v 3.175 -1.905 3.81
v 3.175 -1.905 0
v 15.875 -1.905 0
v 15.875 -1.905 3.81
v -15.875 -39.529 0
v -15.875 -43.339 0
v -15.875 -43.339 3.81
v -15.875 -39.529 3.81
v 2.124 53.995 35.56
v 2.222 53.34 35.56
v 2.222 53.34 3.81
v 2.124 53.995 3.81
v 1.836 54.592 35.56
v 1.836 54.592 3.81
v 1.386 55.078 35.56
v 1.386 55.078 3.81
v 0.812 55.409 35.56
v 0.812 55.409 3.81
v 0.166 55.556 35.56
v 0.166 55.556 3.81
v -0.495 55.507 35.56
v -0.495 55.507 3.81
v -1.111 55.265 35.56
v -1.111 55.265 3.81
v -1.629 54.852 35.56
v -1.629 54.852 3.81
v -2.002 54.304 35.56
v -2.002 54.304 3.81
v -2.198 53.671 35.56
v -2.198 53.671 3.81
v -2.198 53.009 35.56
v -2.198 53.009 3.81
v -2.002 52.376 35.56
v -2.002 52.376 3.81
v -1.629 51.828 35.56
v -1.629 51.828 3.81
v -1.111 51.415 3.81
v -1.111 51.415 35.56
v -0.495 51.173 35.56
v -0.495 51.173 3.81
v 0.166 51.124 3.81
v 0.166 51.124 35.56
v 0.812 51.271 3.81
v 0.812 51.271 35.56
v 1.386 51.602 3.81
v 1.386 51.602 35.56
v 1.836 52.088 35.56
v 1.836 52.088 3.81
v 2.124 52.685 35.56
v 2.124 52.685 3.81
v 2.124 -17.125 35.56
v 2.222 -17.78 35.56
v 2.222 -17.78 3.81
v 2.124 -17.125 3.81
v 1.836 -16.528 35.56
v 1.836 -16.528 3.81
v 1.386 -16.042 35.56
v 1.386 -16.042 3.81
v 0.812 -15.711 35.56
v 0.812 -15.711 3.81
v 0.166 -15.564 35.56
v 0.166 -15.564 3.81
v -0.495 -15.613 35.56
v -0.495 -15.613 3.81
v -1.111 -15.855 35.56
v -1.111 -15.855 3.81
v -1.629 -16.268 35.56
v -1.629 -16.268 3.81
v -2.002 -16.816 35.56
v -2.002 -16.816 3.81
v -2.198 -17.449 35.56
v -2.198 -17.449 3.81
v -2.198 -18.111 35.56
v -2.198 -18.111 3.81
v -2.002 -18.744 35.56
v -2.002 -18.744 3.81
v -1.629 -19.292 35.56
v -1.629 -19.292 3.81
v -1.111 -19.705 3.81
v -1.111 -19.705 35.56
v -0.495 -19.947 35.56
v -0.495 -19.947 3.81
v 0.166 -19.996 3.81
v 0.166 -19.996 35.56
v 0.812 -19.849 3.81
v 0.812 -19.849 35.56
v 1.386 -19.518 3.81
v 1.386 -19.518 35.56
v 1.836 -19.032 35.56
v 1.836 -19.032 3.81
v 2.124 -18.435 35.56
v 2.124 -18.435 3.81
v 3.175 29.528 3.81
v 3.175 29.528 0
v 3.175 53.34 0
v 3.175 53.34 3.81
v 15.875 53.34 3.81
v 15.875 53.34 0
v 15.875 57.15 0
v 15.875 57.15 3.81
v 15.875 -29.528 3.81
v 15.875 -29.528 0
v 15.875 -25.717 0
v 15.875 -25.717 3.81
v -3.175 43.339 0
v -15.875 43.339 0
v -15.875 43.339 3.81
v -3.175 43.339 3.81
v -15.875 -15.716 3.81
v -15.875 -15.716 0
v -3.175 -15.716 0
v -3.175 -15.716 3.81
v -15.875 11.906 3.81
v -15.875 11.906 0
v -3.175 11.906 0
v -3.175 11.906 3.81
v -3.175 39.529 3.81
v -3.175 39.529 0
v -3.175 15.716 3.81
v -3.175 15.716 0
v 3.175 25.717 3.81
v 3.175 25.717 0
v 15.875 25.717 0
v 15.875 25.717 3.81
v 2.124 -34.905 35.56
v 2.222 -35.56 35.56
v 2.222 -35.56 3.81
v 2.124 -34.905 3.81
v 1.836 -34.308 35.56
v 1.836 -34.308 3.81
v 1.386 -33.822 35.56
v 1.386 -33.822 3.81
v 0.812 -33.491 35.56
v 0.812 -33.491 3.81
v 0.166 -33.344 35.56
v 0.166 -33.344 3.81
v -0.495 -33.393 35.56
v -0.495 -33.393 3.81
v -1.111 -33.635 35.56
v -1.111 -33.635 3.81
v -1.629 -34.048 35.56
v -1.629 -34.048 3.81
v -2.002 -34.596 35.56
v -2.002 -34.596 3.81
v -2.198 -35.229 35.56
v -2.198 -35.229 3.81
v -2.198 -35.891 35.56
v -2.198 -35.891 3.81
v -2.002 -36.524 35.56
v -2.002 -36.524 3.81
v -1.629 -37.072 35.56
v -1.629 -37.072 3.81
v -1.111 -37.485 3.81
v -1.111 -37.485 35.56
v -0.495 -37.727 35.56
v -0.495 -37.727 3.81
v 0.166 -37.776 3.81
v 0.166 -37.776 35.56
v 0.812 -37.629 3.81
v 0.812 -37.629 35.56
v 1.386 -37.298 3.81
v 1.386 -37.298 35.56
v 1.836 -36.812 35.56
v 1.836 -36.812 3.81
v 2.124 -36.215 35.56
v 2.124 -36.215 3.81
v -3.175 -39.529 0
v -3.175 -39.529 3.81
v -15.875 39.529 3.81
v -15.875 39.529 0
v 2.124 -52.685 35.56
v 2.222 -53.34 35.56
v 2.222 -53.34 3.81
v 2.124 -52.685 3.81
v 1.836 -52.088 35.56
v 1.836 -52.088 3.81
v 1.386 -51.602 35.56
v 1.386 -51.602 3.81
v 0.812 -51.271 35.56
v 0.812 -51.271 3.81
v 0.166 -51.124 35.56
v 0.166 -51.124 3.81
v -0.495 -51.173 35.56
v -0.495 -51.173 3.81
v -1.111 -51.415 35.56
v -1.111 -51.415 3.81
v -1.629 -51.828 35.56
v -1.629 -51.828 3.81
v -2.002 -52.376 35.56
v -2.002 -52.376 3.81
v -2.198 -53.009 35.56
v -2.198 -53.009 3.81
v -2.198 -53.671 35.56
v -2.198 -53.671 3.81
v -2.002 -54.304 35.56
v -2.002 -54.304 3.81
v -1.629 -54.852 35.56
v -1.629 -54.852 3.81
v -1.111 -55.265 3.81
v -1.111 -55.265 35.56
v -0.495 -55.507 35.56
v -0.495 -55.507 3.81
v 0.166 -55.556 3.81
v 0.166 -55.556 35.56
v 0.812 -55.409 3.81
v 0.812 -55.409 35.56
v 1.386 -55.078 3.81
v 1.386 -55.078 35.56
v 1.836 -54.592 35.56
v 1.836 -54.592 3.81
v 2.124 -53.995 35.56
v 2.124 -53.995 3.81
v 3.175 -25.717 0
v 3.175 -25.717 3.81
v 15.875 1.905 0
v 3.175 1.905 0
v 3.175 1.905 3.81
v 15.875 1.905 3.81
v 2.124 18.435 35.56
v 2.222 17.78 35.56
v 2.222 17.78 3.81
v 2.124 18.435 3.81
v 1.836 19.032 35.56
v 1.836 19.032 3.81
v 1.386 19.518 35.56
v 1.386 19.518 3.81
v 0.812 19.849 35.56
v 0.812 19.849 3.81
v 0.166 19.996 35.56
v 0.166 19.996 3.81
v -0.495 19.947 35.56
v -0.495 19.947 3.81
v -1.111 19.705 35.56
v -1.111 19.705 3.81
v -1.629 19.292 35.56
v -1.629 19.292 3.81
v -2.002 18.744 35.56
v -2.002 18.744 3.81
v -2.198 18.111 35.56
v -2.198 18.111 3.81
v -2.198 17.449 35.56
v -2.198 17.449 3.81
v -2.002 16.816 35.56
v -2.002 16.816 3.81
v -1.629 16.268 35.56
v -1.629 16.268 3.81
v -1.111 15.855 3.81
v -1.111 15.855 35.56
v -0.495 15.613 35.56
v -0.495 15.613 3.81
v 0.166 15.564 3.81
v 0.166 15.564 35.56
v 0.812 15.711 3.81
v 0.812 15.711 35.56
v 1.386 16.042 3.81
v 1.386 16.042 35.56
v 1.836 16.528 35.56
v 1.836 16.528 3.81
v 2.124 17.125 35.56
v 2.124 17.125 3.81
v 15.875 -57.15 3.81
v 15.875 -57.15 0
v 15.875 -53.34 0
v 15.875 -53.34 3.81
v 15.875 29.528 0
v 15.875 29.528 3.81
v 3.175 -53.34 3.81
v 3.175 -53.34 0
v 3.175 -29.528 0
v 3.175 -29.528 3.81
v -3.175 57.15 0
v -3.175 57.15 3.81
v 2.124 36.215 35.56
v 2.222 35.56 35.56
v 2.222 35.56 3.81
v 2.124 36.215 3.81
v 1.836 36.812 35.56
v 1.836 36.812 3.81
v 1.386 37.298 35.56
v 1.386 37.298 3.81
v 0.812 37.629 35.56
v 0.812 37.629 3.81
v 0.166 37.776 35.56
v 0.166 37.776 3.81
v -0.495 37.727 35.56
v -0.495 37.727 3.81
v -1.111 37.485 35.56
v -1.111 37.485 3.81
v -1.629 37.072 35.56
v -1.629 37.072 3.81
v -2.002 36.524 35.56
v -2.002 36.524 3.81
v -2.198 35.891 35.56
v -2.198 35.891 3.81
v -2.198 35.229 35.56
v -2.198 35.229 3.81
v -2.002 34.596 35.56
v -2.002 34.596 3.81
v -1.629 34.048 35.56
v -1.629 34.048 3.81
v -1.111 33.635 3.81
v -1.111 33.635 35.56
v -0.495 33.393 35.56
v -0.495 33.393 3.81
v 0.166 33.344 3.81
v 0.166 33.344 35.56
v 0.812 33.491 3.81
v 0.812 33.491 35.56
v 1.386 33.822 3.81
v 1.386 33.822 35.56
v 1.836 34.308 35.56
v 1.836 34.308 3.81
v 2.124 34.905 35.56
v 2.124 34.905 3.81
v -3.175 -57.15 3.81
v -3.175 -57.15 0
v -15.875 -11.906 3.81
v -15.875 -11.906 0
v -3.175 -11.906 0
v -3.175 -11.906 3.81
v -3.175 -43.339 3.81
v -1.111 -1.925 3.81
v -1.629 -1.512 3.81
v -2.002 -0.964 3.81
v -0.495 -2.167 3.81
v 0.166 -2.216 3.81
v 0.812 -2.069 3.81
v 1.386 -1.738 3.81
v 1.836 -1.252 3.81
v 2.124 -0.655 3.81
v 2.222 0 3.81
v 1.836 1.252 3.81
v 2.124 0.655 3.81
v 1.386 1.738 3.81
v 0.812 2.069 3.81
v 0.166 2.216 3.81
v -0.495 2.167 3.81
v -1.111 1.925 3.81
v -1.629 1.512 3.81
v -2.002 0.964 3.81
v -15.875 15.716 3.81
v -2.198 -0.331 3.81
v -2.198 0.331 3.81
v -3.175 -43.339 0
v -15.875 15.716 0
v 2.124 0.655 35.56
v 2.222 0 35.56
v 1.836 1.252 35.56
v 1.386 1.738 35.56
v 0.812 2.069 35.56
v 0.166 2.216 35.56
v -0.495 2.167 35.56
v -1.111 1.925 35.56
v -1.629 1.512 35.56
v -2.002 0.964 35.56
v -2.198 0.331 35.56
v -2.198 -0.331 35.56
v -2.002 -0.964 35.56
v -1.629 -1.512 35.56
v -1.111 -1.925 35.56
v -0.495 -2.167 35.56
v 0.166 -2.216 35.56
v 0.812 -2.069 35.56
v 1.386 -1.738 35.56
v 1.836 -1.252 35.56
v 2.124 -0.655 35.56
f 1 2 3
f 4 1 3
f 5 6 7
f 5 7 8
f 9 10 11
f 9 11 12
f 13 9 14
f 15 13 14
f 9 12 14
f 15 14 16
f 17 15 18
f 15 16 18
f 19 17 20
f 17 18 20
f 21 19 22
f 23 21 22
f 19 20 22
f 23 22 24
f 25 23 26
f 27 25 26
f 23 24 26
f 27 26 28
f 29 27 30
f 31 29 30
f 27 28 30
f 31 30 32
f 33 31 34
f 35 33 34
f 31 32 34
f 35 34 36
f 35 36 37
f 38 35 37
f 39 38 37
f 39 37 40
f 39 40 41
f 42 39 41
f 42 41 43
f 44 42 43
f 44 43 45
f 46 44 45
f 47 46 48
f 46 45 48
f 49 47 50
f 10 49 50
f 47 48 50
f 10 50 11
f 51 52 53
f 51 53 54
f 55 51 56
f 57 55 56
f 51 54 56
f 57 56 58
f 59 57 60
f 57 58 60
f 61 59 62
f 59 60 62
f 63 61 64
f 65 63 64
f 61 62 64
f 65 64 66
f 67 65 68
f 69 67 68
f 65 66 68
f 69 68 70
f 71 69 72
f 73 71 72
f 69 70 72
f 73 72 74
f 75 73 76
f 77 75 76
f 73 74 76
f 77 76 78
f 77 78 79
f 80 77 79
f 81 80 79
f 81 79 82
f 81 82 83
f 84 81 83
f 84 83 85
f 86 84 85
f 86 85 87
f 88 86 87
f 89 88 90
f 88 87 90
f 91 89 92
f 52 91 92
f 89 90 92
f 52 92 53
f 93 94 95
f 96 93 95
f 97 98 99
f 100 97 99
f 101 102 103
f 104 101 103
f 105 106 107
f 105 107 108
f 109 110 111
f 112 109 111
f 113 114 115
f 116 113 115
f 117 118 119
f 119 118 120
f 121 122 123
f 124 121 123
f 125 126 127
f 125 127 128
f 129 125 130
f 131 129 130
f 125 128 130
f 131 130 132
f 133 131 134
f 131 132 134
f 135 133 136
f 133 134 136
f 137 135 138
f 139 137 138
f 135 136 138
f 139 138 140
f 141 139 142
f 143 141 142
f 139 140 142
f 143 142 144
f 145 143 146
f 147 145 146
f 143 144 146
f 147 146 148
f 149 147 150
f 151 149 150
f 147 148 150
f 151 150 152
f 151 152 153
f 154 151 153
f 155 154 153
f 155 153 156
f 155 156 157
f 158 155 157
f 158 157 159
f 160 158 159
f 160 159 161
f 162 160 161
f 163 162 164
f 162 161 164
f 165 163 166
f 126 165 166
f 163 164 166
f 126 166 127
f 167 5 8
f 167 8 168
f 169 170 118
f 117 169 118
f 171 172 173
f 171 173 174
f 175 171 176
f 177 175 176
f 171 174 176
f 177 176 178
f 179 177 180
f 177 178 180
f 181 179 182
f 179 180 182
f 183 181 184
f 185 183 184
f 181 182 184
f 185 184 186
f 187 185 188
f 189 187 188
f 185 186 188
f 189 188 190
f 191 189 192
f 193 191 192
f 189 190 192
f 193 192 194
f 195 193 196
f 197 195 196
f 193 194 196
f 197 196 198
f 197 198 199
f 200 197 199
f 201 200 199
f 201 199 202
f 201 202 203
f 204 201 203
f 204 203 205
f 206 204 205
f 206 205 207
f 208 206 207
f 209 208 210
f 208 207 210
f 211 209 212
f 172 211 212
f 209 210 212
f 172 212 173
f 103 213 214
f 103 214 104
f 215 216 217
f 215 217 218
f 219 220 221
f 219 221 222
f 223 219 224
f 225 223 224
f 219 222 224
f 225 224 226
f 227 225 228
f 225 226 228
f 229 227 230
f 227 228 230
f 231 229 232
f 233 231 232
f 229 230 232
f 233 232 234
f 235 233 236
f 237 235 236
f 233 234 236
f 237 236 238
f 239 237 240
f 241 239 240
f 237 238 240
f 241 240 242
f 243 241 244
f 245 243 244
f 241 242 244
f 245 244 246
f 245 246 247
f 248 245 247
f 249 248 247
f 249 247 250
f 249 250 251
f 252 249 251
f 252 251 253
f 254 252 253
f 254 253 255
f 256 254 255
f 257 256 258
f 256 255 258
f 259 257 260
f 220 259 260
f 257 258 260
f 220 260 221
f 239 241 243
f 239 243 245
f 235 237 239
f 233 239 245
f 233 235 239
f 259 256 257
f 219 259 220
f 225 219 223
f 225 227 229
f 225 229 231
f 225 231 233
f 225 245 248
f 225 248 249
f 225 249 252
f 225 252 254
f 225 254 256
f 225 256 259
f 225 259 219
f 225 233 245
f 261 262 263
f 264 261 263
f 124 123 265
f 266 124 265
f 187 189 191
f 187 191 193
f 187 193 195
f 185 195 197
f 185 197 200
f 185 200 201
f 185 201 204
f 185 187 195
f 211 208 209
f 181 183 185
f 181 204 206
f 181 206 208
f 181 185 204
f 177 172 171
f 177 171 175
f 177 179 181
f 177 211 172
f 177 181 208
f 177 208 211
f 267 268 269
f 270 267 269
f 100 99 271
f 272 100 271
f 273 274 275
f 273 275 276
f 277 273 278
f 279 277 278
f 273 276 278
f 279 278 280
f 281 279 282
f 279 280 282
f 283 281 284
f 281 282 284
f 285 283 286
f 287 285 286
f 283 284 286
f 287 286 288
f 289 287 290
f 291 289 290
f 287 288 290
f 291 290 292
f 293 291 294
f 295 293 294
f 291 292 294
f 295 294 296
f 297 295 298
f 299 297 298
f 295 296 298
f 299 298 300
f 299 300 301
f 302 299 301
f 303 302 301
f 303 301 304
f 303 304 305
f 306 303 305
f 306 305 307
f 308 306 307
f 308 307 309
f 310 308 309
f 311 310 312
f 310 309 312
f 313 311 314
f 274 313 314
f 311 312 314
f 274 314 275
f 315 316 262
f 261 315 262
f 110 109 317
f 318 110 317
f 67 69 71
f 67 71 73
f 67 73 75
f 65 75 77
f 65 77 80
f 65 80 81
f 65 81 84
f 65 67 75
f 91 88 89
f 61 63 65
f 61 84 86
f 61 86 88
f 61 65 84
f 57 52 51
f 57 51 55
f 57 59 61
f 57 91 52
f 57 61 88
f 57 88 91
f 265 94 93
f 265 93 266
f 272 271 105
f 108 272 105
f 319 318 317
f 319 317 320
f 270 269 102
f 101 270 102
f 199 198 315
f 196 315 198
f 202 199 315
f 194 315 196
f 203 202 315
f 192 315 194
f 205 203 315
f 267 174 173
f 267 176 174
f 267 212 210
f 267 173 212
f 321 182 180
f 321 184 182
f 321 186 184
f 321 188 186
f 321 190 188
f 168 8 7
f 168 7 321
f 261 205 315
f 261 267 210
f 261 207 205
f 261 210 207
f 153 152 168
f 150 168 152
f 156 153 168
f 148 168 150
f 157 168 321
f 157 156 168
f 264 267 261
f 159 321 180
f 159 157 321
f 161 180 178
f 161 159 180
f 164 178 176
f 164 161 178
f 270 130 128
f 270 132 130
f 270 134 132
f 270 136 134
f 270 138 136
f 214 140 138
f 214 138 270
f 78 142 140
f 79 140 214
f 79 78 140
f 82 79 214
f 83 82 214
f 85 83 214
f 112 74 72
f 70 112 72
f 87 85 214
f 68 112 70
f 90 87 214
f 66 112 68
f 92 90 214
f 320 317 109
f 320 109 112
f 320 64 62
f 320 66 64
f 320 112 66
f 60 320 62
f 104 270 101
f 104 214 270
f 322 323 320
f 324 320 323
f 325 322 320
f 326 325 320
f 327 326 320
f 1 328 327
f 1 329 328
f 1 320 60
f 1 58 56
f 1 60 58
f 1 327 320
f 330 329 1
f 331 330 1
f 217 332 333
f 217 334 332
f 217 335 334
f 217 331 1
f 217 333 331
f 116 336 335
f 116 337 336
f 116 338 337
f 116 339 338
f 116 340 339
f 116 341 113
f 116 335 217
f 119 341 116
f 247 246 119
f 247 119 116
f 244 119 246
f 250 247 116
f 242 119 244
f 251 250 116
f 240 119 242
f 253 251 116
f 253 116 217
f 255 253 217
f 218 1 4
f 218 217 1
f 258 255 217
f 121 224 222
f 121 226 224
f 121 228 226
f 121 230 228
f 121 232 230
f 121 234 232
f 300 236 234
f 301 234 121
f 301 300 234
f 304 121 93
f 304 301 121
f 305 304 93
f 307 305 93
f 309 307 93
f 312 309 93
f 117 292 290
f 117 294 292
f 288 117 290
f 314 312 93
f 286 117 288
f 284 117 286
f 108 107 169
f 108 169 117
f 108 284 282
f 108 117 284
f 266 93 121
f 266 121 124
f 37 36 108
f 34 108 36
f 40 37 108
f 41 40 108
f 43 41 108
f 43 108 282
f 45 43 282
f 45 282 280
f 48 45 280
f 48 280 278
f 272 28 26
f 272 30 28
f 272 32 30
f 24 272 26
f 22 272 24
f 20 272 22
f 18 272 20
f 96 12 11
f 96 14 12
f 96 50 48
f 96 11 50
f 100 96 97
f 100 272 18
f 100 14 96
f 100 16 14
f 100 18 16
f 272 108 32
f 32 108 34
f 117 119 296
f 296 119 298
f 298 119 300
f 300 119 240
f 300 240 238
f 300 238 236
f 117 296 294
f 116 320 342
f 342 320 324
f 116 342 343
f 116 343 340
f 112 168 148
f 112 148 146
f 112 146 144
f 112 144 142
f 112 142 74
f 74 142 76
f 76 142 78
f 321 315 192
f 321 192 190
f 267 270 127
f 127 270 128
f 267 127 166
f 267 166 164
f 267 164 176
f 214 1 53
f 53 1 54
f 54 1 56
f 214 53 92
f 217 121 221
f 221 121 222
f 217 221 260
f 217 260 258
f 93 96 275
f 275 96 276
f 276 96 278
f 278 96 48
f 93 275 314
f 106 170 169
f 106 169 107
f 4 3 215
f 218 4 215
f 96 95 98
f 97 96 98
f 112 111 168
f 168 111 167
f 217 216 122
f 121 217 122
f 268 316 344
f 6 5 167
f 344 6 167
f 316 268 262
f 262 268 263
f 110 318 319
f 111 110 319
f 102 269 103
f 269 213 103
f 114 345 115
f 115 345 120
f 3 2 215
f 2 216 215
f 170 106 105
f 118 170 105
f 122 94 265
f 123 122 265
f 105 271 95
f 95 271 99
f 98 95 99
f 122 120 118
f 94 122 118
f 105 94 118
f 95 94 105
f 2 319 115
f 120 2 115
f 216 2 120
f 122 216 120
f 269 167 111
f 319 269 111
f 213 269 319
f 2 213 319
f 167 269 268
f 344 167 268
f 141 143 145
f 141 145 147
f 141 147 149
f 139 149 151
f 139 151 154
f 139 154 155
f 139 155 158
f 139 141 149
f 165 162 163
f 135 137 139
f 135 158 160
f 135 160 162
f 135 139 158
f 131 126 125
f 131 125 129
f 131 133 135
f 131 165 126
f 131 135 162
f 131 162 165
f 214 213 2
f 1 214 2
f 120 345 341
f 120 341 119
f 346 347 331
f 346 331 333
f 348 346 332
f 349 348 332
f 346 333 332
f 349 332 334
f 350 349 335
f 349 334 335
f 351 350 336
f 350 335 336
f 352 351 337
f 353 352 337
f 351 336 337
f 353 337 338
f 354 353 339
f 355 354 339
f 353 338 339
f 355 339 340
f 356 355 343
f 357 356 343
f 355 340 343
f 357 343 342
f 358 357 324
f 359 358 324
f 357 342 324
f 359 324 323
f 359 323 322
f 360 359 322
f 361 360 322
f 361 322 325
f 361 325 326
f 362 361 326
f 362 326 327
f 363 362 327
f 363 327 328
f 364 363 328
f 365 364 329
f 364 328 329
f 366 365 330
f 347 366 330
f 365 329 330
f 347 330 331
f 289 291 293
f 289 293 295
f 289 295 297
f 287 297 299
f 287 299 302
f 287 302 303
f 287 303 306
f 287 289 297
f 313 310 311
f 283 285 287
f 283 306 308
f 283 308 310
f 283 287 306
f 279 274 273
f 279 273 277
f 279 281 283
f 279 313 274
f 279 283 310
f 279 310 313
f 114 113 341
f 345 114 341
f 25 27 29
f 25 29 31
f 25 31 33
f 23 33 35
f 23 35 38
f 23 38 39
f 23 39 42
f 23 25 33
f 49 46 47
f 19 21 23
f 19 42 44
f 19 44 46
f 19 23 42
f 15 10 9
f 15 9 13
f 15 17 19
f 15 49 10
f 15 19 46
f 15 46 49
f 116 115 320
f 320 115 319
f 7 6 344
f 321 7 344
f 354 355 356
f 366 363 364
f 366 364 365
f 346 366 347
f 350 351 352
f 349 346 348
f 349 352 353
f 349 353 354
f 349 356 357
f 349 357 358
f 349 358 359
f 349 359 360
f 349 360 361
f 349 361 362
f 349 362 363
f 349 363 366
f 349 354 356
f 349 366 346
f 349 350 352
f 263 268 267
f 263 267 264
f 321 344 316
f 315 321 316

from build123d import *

# Parameters (mm, degrees)
F0_W     = 12.7
F0_H     = 3.81
F1_DEPTH = 3.81
F2_R     = 2.2225
F3_DEPTH = 31.75


with BuildPart() as f1:
    # F0 (on Top) → F1 (new body)
    with BuildSketch(Plane.XY):
        Polygon((3.175, 57.15), (-3.175, 57.15), (-3.175, 43.33875), (-3.175, 39.52875), (-3.175, 15.71625), (-3.175, 11.90625), (-3.175, -11.90625), (-3.175, -15.71625), (-3.175, -39.52875), (-3.175, -43.33875), (-3.175, -57.15), (3.175, -57.15), (3.175, -53.34), (3.175, -29.5275), (3.175, -25.7175), (3.175, -1.905), (3.175, 1.905), (3.175, 25.7175), (3.175, 29.5275), (3.175, 53.34), align=None)
        with Locations((-9.525, -41.43375)):
            Rectangle(F0_W, F0_H)
        with Locations((9.525, 0)):
            Rectangle(F0_W, F0_H)
        with Locations((9.525, 55.245)):
            Rectangle(F0_W, F0_H)
        with Locations((-9.525, -13.81125)):
            Rectangle(F0_W, F0_H)
        with Locations((9.525, 27.6225)):
            Rectangle(F0_W, F0_H)
        with Locations((9.525, -55.245)):
            Rectangle(F0_W, F0_H)
        with Locations((-9.525, 13.81125)):
            Rectangle(F0_W, F0_H)
        with Locations((9.525, -27.6225)):
            Rectangle(F0_W, F0_H)
        with Locations((-9.525, 41.43375)):
            Rectangle(F0_W, F0_H)
    extrude(amount=F1_DEPTH)

    # F2 (on face) → F3 (join)
    with BuildSketch(Plane.XY.offset(3.81)):
        Circle(F2_R)
        with Locations((0, 17.78)):
            Circle(F2_R)
        with Locations((0, 35.56)):
            Circle(F2_R)
        with Locations((0, 53.34)):
            Circle(F2_R)
        with Locations((0, -17.78)):
            Circle(F2_R)
        with Locations((0, -35.56)):
            Circle(F2_R)
        with Locations((0, -53.34)):
            Circle(F2_R)
    extrude(amount=F3_DEPTH)


solid = f1.part
